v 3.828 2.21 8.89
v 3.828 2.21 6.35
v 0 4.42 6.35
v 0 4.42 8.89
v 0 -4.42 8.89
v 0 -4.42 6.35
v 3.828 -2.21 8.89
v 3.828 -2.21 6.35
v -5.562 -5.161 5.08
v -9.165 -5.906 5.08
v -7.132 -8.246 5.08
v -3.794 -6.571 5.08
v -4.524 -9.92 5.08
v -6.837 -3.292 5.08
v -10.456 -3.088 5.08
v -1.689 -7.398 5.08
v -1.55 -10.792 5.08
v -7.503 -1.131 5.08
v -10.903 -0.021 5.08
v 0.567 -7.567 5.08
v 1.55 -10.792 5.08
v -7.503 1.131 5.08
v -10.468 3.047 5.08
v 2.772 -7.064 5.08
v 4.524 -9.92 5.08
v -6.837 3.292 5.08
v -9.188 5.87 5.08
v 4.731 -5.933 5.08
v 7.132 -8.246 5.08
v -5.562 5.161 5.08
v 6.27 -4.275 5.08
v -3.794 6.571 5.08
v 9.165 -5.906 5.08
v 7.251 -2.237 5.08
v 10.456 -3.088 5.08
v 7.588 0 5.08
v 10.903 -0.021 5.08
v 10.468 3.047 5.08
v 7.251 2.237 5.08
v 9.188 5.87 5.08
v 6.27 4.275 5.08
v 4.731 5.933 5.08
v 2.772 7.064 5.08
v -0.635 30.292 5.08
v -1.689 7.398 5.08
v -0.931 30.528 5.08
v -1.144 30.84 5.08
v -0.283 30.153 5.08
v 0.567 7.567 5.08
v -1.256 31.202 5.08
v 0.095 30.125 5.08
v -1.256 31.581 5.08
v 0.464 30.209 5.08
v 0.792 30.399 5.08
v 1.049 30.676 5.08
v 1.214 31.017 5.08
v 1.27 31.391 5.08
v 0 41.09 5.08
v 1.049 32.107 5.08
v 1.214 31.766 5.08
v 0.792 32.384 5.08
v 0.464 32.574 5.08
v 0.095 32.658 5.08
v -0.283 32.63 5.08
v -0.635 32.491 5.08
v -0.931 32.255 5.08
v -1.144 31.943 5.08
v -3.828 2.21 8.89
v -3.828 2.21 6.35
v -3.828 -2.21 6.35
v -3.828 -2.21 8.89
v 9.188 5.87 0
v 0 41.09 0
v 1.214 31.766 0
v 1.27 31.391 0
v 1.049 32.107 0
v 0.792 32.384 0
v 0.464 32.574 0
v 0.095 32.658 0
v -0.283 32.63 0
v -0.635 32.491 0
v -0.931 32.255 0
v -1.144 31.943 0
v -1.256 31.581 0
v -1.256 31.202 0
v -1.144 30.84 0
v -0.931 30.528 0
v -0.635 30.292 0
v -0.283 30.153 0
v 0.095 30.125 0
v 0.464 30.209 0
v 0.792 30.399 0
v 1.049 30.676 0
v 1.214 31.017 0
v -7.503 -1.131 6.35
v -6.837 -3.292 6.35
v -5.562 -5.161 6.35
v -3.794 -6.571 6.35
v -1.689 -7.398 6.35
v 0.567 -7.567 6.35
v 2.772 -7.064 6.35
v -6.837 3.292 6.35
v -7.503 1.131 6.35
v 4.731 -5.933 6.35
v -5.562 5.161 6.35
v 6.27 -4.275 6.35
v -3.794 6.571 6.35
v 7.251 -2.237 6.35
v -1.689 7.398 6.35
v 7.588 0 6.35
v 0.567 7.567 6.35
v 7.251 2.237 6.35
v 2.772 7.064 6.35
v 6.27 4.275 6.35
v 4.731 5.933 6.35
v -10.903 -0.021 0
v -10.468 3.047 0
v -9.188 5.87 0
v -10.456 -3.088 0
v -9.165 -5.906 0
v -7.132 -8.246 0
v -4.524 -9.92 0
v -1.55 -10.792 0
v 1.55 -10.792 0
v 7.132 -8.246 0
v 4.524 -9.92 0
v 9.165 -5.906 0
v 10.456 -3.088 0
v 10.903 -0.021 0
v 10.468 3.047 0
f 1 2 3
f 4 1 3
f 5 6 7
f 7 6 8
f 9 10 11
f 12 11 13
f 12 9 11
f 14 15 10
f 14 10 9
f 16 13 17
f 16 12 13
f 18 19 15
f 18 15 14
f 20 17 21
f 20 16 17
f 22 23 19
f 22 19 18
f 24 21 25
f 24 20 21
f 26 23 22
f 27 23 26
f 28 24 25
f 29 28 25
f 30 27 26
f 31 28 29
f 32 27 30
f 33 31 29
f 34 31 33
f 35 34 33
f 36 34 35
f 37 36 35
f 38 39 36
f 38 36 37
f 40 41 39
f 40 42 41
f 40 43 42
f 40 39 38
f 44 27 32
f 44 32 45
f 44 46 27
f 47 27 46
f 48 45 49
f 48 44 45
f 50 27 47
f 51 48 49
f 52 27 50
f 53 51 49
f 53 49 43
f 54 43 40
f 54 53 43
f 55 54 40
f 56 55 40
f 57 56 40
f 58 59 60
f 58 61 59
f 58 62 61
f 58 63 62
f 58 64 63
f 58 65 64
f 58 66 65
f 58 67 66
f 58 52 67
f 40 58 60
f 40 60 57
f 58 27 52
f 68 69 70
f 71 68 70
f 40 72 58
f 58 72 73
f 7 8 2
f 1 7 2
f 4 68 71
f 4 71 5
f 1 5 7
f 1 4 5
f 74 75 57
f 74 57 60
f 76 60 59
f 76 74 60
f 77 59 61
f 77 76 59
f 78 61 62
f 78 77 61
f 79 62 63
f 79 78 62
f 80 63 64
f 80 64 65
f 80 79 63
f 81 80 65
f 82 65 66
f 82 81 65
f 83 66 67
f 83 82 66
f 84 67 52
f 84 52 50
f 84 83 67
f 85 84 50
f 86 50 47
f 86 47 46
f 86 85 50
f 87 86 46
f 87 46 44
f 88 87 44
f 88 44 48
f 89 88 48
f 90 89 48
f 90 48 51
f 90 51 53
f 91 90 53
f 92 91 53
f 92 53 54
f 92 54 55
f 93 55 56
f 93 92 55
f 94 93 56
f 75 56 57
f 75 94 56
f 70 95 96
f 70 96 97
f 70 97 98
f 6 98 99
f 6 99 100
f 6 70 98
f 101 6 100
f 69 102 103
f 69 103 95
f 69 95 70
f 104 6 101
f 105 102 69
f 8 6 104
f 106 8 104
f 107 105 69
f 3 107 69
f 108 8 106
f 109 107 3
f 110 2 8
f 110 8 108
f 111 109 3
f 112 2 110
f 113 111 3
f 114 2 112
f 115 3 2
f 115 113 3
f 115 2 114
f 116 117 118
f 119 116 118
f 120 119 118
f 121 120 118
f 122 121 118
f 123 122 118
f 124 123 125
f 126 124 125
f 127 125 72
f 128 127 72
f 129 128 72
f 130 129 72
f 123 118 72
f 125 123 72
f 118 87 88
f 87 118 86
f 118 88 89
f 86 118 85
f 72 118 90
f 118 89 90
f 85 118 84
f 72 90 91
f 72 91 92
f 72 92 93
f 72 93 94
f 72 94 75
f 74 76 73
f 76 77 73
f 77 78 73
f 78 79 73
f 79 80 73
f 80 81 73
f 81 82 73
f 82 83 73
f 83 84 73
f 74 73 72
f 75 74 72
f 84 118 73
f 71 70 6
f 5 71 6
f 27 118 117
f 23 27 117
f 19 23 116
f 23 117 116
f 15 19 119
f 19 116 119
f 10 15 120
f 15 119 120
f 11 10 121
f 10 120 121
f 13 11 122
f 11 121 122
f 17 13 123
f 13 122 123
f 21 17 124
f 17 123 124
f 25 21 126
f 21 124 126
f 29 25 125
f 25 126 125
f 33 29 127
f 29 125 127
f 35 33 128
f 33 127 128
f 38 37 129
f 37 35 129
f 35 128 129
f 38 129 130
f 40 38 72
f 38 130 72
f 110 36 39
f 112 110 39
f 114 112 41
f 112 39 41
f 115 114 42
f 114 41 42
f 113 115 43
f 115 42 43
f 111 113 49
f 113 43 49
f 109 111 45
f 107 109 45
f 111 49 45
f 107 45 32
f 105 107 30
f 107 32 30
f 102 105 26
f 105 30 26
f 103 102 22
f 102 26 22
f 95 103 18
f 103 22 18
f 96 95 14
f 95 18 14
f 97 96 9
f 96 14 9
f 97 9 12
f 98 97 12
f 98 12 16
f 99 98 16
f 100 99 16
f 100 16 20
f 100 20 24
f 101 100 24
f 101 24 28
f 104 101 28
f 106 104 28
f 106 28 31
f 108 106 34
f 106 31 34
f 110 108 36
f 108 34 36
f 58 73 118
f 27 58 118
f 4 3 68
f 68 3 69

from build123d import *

# Parameters (mm, degrees)
F2_R     = 1.27
F3_DEPTH = 5.08
F0_R     = 10.902803
F4_DEPTH = 5.08
F5_R     = 7.588096
F6_DEPTH = 1.27
F8_DEPTH = 2.54


with BuildPart() as f3:
    # F2 (on face) → F3 (new body)
    with BuildSketch(Plane.XY):
        Polygon((10.719042, 0), (0, 41.089665), (-10.719042, 0), align=None)
        with Locations((0, 31.391483)):
            Circle(F2_R, mode=Mode.SUBTRACT)
    extrude(amount=F3_DEPTH)

    # F0 (on Top) → F4 (join)
    with BuildSketch(Plane.XY):
        Circle(F0_R)
    extrude(amount=F4_DEPTH)

    # F5 (on face) → F6 (join)
    with BuildSketch(Plane.XY.offset(5.08)):
        Circle(F5_R)
    extrude(amount=F6_DEPTH)

    # F7 (on face) → F8 (join)
    with BuildSketch(Plane.XY.offset(6.35)):
        Polygon((3.828231, -2.21023), (3.828231, 2.21023), (0, 4.42046), (-3.828231, 2.21023), (-3.828231, -2.21023), (0, -4.42046), align=None)
    extrude(amount=F8_DEPTH)


solid = f3.part
